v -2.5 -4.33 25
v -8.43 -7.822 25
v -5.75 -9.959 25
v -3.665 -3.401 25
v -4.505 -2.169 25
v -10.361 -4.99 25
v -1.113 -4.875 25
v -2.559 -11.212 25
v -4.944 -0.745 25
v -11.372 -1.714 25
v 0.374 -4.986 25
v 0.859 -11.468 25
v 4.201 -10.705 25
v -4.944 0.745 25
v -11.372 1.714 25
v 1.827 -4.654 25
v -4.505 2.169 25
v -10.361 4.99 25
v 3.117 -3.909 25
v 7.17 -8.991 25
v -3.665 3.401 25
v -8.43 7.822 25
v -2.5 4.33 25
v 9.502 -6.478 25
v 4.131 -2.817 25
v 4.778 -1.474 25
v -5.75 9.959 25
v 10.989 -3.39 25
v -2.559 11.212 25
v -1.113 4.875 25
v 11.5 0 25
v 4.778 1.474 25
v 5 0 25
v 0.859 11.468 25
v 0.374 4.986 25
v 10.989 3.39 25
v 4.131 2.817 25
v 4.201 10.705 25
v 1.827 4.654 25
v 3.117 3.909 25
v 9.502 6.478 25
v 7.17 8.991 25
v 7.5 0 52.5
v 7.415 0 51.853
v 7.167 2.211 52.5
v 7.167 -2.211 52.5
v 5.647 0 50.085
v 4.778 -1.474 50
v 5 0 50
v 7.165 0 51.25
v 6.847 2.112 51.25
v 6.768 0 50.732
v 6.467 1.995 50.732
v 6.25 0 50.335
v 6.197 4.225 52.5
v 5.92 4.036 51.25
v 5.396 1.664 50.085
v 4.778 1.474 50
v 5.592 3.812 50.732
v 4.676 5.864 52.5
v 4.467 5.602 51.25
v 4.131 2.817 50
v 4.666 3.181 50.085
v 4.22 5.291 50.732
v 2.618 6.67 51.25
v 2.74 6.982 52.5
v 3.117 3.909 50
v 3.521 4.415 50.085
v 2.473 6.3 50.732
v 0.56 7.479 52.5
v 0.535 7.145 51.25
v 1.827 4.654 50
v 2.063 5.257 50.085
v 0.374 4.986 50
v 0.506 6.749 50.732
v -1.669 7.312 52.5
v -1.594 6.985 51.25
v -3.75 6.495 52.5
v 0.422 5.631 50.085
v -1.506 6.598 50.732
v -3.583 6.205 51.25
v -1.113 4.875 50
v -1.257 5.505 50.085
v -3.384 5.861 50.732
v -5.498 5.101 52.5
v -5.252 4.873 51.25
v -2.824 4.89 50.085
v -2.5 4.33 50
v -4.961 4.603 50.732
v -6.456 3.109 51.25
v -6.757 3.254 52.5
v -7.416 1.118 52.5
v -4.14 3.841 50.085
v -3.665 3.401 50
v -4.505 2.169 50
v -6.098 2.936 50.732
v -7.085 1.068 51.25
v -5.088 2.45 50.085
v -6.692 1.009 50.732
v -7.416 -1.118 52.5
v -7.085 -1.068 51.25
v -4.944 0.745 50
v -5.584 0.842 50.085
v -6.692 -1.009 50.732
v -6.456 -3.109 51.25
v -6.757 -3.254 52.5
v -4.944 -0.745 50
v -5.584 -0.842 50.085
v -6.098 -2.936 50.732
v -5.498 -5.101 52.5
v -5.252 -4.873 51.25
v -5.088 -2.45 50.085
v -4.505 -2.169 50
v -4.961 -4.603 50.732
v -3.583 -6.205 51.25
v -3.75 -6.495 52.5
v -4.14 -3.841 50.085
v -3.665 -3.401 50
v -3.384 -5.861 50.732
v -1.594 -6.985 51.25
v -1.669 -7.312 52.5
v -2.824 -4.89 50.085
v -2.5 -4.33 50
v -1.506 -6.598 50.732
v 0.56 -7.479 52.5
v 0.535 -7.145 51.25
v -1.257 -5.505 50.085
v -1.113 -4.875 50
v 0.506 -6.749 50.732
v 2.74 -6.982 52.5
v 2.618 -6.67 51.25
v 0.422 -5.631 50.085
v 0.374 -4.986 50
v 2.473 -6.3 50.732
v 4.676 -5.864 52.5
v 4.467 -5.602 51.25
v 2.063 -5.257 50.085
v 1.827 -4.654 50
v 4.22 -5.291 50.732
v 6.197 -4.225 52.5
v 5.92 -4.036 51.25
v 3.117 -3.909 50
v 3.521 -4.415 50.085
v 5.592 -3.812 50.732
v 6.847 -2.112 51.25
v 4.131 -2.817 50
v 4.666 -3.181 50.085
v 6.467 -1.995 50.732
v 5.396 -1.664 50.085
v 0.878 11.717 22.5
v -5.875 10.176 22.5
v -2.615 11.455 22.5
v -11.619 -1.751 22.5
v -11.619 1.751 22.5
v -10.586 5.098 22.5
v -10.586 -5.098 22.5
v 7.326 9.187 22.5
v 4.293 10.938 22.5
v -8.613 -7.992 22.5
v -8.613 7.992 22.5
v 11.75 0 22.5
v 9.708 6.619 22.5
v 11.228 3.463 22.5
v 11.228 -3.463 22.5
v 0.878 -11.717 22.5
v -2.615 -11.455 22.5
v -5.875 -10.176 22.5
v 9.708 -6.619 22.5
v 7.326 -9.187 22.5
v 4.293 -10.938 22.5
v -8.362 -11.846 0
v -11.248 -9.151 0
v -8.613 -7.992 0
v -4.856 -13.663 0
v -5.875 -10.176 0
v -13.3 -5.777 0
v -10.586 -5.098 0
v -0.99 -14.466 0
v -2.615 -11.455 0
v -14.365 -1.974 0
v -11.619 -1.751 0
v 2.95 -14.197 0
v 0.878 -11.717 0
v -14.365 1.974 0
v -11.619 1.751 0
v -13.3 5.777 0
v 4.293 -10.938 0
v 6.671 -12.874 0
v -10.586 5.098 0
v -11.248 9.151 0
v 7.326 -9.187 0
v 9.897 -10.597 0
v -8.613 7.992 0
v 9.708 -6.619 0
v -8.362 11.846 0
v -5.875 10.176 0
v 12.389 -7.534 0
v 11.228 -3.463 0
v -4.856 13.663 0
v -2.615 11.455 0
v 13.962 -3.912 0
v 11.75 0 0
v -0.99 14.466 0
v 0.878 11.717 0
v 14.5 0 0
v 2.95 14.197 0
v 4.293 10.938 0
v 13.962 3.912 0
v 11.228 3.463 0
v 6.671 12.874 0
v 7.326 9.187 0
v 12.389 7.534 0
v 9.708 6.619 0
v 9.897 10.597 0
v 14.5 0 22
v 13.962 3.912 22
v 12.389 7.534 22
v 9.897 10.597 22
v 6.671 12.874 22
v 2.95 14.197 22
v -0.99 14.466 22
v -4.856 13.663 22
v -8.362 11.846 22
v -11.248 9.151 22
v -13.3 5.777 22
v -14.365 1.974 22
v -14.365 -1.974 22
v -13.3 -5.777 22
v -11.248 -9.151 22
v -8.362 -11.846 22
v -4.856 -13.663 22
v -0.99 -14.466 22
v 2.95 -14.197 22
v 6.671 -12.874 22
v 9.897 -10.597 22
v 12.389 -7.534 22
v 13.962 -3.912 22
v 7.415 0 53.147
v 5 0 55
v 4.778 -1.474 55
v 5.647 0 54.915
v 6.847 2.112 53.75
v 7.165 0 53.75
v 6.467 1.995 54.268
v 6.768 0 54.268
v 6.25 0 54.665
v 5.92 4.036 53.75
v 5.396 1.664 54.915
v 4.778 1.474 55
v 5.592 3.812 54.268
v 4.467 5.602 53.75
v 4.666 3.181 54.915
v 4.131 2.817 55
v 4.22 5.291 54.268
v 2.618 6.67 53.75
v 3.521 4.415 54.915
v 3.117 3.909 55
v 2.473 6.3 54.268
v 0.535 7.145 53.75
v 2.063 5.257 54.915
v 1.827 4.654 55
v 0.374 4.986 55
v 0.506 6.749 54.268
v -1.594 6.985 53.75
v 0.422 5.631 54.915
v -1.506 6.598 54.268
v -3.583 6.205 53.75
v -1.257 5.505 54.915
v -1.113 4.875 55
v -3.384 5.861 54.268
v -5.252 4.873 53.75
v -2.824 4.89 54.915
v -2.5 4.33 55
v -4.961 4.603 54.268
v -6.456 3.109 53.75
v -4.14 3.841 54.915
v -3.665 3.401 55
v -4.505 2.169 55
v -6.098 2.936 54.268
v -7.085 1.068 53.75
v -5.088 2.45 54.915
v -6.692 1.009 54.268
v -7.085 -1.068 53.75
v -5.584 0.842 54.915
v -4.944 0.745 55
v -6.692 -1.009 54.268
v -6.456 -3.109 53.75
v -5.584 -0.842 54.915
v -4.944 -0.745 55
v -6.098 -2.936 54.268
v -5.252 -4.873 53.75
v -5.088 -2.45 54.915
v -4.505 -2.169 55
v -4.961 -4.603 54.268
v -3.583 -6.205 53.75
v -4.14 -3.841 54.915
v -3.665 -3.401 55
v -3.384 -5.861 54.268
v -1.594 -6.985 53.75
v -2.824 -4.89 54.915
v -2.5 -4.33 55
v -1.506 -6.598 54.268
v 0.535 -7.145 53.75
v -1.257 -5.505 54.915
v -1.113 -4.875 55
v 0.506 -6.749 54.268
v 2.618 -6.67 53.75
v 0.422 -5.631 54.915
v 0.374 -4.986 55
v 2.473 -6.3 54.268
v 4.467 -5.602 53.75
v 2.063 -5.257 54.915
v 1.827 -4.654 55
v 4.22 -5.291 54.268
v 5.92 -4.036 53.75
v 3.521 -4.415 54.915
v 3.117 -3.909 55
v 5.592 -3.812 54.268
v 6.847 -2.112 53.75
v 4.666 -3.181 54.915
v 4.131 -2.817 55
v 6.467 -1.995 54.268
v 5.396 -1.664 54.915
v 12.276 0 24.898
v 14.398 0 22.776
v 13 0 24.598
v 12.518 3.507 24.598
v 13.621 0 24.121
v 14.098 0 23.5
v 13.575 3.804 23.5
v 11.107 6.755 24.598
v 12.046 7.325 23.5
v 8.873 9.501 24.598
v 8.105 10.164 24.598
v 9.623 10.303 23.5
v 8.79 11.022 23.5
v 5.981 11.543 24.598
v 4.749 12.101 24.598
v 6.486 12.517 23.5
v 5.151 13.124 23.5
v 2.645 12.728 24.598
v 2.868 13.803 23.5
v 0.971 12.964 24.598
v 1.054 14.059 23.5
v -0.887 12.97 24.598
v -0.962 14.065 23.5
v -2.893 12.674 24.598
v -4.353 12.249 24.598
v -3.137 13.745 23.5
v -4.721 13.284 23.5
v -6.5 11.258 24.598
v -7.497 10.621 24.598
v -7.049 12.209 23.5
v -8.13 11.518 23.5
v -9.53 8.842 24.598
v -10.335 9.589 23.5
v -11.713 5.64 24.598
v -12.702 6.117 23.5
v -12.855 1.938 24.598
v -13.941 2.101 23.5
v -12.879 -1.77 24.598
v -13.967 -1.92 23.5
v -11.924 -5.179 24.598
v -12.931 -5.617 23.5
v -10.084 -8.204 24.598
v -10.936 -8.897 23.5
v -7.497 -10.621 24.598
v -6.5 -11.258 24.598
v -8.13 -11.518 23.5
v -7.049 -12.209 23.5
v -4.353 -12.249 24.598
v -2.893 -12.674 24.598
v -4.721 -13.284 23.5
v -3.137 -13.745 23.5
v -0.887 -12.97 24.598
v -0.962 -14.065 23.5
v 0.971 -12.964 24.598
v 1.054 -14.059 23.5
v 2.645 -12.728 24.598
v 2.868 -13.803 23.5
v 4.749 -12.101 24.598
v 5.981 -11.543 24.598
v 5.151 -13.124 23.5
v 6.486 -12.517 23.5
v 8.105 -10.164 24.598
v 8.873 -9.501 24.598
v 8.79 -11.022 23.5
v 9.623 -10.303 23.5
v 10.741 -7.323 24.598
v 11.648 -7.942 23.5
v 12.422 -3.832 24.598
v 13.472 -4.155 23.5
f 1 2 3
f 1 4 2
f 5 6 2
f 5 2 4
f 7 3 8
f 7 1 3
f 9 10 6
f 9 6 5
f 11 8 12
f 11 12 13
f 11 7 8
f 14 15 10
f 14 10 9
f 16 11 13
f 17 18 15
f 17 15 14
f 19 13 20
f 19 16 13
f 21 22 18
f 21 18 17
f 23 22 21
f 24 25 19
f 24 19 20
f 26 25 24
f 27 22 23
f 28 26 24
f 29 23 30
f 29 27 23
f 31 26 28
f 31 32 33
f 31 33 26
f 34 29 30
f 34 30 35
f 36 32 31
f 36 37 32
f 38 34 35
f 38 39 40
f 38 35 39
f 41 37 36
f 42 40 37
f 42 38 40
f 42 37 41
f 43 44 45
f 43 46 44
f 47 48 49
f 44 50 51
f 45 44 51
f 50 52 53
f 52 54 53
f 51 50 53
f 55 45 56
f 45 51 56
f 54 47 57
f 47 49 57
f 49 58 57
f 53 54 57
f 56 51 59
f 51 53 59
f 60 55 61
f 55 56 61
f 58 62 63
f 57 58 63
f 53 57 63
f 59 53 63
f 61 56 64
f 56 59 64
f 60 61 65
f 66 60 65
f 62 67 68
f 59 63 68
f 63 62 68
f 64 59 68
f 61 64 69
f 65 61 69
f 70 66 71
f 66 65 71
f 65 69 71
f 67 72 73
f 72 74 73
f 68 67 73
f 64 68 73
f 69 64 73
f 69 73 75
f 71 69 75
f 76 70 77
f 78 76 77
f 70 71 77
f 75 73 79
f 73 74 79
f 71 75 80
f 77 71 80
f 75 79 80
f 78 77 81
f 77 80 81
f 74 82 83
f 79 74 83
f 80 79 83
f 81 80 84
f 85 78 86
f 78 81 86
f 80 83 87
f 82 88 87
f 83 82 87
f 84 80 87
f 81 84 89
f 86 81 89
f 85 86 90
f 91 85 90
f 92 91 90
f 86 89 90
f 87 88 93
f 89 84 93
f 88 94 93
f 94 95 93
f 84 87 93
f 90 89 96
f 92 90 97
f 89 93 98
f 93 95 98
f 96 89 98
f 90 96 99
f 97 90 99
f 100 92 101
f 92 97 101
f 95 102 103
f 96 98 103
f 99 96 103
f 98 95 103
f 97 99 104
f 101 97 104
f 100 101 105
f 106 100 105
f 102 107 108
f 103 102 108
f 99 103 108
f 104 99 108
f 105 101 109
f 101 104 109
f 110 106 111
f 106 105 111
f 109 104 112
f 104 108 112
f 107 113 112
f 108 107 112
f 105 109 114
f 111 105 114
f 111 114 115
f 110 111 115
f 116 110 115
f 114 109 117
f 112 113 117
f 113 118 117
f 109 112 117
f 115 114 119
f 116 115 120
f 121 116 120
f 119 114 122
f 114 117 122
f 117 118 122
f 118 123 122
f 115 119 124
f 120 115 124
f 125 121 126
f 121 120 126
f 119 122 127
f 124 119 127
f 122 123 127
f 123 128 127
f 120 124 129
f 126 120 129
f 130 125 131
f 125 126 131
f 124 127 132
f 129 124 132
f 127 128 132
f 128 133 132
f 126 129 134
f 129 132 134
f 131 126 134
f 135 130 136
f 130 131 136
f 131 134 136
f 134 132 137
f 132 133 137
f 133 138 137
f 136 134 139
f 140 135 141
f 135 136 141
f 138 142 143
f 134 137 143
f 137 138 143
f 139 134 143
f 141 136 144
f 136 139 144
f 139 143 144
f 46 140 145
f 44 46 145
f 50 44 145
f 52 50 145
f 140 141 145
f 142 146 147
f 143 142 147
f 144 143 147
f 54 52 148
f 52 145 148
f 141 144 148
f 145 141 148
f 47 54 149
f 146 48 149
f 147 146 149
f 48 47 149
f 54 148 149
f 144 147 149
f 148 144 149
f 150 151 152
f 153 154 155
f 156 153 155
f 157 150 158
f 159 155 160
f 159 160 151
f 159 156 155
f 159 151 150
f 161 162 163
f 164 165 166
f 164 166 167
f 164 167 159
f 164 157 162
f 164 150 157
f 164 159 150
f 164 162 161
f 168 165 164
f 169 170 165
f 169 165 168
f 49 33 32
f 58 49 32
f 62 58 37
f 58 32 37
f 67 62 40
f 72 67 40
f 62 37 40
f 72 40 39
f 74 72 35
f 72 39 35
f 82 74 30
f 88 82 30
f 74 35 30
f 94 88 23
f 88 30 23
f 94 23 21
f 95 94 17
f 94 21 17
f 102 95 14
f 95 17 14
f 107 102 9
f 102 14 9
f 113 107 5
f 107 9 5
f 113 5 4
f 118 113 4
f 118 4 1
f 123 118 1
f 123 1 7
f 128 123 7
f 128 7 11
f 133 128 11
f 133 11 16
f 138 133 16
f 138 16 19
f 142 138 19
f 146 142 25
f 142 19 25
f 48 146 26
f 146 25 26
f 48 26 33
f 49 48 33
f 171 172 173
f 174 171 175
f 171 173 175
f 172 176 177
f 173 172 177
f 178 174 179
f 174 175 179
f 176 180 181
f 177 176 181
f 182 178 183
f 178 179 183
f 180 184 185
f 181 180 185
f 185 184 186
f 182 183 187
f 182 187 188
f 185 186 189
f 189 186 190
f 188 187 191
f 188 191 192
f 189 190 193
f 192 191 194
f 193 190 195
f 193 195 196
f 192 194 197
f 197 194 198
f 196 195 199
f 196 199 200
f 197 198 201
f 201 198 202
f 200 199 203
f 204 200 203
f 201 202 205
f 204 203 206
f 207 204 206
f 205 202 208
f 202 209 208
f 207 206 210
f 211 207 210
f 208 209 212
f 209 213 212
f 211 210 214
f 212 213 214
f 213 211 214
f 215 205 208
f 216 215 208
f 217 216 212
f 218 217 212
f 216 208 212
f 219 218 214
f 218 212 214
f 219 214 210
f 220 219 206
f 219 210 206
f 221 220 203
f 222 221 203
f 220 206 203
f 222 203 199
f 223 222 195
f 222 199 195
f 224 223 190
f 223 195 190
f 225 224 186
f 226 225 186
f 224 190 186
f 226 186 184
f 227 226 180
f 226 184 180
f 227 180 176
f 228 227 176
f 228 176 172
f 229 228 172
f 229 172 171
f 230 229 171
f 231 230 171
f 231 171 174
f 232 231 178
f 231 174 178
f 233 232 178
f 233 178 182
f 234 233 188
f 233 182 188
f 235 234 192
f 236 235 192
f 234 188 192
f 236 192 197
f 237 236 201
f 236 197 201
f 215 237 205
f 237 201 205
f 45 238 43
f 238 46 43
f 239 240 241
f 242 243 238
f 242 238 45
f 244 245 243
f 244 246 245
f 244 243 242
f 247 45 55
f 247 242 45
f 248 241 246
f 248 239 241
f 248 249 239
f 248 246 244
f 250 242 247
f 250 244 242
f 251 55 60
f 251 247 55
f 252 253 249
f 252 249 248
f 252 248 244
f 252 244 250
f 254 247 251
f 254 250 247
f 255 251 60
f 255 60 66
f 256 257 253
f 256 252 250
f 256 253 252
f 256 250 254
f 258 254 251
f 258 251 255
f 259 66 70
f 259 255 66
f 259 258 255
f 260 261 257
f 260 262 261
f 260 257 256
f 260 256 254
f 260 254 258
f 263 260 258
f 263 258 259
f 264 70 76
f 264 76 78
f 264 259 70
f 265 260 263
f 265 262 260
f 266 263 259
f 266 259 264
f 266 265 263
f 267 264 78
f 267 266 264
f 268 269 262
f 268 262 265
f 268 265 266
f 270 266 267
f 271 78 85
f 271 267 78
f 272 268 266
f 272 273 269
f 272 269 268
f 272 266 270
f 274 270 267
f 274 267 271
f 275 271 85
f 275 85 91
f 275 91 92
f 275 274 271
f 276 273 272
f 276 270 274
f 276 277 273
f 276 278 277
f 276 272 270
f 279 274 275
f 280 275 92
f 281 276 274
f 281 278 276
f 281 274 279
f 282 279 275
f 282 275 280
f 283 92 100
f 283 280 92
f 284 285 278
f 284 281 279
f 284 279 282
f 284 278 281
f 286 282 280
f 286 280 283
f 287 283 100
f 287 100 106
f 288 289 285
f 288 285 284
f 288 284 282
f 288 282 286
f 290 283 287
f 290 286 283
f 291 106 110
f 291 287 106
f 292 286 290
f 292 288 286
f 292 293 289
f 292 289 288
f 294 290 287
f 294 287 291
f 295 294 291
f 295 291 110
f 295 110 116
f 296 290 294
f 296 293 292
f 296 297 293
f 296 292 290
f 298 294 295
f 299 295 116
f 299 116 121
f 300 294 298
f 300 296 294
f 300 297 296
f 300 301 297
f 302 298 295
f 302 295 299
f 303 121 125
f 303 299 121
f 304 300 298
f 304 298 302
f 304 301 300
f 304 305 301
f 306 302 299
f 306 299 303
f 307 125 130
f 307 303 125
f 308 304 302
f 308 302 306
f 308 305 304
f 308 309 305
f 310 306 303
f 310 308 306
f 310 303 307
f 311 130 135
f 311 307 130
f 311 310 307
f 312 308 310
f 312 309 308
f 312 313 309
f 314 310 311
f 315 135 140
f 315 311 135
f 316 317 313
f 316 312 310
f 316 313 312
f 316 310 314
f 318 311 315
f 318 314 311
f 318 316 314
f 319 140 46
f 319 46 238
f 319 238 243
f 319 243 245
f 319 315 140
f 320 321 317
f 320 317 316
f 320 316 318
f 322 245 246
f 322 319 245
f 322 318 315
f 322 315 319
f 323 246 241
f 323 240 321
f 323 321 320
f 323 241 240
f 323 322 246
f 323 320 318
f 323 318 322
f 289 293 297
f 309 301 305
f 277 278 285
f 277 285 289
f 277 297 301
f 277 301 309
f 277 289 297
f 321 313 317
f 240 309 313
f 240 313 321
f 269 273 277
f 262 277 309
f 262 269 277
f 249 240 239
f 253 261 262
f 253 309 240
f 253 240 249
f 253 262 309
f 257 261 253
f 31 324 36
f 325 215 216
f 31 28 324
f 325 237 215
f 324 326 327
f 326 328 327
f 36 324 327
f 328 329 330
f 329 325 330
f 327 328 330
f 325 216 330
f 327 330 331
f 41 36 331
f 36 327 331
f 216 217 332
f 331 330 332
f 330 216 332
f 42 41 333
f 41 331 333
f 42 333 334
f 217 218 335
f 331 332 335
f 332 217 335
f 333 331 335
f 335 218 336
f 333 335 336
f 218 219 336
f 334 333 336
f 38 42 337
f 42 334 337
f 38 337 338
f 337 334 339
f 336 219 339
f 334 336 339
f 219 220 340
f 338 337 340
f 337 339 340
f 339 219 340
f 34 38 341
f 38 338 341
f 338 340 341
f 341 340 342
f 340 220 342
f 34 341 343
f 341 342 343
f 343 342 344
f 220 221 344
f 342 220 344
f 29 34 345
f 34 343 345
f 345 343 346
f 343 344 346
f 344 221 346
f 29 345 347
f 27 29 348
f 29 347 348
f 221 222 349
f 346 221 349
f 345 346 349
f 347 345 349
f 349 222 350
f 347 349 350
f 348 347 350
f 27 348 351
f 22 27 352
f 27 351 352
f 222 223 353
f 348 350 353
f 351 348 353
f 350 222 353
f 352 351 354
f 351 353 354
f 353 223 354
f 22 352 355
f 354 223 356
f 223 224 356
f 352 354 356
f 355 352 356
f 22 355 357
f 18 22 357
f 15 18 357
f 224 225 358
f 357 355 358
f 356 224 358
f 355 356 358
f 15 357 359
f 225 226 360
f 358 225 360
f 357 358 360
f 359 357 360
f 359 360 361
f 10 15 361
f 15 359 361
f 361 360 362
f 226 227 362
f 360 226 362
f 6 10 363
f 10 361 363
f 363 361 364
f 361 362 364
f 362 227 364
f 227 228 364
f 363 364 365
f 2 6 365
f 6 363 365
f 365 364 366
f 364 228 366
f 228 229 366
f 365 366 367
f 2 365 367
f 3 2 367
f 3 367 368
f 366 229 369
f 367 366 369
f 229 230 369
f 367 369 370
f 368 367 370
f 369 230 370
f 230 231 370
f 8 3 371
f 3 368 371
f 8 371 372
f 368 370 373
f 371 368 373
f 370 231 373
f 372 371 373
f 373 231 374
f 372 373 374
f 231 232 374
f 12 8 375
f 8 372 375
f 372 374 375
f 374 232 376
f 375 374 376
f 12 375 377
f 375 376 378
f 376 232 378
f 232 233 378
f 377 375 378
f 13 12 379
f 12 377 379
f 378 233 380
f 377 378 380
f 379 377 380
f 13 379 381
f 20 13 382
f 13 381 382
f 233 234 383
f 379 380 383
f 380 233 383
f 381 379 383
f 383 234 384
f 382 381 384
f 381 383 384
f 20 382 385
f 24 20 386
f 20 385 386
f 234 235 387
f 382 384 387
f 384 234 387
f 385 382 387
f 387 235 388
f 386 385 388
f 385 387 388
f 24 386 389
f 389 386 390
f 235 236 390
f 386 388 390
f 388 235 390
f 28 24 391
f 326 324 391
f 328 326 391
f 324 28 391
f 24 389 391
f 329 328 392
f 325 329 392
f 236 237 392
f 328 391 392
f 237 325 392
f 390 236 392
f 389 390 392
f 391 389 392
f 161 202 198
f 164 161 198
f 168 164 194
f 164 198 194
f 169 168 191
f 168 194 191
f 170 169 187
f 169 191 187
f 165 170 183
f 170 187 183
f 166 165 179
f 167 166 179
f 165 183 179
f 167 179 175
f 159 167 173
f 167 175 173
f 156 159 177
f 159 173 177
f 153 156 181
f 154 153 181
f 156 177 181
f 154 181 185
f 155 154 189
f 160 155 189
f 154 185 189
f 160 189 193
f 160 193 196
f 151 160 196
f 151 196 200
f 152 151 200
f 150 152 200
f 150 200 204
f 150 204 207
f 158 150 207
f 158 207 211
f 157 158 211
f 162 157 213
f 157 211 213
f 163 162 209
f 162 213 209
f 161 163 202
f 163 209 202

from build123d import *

# Parameters (mm, degrees)
F0_R     = 14.5
F1_DEPTH = 25
F2_R     = 5
F3_DEPTH = 25
F4_R     = 7.5
F5_DEPTH = 5
F6_R     = 2.49999
F7_R     = 3
F8_R     = 11.75
F9_DEPTH = 22.5


# Not quite as in the source:
# - a fillet or chamfer is up to 0.001 mm smaller than in the source, because OpenCascade refuses the exact size


with BuildPart() as f1:
    # F0 (on Top) → F1 (new body)
    with BuildSketch(Plane.XY):
        Circle(F0_R)
    extrude(amount=F1_DEPTH)

    # F2 (on face) → F3 (join)
    with BuildSketch(Plane.XY.offset(25)):
        Circle(F2_R)
    extrude(amount=F3_DEPTH)

    # F4 (on face) → F5 (join)
    with BuildSketch(Plane.XY.offset(50)):
        Circle(F4_R)
    extrude(amount=F5_DEPTH)

    # F6 (radius 2.5 in the source; OpenCascade refuses exactly that, so slightly less here)
    f6_edges = [f1.edges().sort_by_distance(p)[0] for p in [
        (-7.5, 0, 50),
        (-7.5, 0, 55),
    ]]
    fillet(f6_edges, radius=F6_R)

    # F7
    f7_edges = [f1.edges().sort_by_distance(p)[0] for p in [
        (-14.5, 0, 25),
    ]]
    fillet(f7_edges, radius=F7_R)

    # F8 (on face) → F9 (cut)
    with BuildSketch(Plane(origin=(0, 0, 0), x_dir=(1, 0, 0), z_dir=(0, 0, -1))):
        Circle(F8_R)
    extrude(amount=-F9_DEPTH, mode=Mode.SUBTRACT)


solid = f1.part
